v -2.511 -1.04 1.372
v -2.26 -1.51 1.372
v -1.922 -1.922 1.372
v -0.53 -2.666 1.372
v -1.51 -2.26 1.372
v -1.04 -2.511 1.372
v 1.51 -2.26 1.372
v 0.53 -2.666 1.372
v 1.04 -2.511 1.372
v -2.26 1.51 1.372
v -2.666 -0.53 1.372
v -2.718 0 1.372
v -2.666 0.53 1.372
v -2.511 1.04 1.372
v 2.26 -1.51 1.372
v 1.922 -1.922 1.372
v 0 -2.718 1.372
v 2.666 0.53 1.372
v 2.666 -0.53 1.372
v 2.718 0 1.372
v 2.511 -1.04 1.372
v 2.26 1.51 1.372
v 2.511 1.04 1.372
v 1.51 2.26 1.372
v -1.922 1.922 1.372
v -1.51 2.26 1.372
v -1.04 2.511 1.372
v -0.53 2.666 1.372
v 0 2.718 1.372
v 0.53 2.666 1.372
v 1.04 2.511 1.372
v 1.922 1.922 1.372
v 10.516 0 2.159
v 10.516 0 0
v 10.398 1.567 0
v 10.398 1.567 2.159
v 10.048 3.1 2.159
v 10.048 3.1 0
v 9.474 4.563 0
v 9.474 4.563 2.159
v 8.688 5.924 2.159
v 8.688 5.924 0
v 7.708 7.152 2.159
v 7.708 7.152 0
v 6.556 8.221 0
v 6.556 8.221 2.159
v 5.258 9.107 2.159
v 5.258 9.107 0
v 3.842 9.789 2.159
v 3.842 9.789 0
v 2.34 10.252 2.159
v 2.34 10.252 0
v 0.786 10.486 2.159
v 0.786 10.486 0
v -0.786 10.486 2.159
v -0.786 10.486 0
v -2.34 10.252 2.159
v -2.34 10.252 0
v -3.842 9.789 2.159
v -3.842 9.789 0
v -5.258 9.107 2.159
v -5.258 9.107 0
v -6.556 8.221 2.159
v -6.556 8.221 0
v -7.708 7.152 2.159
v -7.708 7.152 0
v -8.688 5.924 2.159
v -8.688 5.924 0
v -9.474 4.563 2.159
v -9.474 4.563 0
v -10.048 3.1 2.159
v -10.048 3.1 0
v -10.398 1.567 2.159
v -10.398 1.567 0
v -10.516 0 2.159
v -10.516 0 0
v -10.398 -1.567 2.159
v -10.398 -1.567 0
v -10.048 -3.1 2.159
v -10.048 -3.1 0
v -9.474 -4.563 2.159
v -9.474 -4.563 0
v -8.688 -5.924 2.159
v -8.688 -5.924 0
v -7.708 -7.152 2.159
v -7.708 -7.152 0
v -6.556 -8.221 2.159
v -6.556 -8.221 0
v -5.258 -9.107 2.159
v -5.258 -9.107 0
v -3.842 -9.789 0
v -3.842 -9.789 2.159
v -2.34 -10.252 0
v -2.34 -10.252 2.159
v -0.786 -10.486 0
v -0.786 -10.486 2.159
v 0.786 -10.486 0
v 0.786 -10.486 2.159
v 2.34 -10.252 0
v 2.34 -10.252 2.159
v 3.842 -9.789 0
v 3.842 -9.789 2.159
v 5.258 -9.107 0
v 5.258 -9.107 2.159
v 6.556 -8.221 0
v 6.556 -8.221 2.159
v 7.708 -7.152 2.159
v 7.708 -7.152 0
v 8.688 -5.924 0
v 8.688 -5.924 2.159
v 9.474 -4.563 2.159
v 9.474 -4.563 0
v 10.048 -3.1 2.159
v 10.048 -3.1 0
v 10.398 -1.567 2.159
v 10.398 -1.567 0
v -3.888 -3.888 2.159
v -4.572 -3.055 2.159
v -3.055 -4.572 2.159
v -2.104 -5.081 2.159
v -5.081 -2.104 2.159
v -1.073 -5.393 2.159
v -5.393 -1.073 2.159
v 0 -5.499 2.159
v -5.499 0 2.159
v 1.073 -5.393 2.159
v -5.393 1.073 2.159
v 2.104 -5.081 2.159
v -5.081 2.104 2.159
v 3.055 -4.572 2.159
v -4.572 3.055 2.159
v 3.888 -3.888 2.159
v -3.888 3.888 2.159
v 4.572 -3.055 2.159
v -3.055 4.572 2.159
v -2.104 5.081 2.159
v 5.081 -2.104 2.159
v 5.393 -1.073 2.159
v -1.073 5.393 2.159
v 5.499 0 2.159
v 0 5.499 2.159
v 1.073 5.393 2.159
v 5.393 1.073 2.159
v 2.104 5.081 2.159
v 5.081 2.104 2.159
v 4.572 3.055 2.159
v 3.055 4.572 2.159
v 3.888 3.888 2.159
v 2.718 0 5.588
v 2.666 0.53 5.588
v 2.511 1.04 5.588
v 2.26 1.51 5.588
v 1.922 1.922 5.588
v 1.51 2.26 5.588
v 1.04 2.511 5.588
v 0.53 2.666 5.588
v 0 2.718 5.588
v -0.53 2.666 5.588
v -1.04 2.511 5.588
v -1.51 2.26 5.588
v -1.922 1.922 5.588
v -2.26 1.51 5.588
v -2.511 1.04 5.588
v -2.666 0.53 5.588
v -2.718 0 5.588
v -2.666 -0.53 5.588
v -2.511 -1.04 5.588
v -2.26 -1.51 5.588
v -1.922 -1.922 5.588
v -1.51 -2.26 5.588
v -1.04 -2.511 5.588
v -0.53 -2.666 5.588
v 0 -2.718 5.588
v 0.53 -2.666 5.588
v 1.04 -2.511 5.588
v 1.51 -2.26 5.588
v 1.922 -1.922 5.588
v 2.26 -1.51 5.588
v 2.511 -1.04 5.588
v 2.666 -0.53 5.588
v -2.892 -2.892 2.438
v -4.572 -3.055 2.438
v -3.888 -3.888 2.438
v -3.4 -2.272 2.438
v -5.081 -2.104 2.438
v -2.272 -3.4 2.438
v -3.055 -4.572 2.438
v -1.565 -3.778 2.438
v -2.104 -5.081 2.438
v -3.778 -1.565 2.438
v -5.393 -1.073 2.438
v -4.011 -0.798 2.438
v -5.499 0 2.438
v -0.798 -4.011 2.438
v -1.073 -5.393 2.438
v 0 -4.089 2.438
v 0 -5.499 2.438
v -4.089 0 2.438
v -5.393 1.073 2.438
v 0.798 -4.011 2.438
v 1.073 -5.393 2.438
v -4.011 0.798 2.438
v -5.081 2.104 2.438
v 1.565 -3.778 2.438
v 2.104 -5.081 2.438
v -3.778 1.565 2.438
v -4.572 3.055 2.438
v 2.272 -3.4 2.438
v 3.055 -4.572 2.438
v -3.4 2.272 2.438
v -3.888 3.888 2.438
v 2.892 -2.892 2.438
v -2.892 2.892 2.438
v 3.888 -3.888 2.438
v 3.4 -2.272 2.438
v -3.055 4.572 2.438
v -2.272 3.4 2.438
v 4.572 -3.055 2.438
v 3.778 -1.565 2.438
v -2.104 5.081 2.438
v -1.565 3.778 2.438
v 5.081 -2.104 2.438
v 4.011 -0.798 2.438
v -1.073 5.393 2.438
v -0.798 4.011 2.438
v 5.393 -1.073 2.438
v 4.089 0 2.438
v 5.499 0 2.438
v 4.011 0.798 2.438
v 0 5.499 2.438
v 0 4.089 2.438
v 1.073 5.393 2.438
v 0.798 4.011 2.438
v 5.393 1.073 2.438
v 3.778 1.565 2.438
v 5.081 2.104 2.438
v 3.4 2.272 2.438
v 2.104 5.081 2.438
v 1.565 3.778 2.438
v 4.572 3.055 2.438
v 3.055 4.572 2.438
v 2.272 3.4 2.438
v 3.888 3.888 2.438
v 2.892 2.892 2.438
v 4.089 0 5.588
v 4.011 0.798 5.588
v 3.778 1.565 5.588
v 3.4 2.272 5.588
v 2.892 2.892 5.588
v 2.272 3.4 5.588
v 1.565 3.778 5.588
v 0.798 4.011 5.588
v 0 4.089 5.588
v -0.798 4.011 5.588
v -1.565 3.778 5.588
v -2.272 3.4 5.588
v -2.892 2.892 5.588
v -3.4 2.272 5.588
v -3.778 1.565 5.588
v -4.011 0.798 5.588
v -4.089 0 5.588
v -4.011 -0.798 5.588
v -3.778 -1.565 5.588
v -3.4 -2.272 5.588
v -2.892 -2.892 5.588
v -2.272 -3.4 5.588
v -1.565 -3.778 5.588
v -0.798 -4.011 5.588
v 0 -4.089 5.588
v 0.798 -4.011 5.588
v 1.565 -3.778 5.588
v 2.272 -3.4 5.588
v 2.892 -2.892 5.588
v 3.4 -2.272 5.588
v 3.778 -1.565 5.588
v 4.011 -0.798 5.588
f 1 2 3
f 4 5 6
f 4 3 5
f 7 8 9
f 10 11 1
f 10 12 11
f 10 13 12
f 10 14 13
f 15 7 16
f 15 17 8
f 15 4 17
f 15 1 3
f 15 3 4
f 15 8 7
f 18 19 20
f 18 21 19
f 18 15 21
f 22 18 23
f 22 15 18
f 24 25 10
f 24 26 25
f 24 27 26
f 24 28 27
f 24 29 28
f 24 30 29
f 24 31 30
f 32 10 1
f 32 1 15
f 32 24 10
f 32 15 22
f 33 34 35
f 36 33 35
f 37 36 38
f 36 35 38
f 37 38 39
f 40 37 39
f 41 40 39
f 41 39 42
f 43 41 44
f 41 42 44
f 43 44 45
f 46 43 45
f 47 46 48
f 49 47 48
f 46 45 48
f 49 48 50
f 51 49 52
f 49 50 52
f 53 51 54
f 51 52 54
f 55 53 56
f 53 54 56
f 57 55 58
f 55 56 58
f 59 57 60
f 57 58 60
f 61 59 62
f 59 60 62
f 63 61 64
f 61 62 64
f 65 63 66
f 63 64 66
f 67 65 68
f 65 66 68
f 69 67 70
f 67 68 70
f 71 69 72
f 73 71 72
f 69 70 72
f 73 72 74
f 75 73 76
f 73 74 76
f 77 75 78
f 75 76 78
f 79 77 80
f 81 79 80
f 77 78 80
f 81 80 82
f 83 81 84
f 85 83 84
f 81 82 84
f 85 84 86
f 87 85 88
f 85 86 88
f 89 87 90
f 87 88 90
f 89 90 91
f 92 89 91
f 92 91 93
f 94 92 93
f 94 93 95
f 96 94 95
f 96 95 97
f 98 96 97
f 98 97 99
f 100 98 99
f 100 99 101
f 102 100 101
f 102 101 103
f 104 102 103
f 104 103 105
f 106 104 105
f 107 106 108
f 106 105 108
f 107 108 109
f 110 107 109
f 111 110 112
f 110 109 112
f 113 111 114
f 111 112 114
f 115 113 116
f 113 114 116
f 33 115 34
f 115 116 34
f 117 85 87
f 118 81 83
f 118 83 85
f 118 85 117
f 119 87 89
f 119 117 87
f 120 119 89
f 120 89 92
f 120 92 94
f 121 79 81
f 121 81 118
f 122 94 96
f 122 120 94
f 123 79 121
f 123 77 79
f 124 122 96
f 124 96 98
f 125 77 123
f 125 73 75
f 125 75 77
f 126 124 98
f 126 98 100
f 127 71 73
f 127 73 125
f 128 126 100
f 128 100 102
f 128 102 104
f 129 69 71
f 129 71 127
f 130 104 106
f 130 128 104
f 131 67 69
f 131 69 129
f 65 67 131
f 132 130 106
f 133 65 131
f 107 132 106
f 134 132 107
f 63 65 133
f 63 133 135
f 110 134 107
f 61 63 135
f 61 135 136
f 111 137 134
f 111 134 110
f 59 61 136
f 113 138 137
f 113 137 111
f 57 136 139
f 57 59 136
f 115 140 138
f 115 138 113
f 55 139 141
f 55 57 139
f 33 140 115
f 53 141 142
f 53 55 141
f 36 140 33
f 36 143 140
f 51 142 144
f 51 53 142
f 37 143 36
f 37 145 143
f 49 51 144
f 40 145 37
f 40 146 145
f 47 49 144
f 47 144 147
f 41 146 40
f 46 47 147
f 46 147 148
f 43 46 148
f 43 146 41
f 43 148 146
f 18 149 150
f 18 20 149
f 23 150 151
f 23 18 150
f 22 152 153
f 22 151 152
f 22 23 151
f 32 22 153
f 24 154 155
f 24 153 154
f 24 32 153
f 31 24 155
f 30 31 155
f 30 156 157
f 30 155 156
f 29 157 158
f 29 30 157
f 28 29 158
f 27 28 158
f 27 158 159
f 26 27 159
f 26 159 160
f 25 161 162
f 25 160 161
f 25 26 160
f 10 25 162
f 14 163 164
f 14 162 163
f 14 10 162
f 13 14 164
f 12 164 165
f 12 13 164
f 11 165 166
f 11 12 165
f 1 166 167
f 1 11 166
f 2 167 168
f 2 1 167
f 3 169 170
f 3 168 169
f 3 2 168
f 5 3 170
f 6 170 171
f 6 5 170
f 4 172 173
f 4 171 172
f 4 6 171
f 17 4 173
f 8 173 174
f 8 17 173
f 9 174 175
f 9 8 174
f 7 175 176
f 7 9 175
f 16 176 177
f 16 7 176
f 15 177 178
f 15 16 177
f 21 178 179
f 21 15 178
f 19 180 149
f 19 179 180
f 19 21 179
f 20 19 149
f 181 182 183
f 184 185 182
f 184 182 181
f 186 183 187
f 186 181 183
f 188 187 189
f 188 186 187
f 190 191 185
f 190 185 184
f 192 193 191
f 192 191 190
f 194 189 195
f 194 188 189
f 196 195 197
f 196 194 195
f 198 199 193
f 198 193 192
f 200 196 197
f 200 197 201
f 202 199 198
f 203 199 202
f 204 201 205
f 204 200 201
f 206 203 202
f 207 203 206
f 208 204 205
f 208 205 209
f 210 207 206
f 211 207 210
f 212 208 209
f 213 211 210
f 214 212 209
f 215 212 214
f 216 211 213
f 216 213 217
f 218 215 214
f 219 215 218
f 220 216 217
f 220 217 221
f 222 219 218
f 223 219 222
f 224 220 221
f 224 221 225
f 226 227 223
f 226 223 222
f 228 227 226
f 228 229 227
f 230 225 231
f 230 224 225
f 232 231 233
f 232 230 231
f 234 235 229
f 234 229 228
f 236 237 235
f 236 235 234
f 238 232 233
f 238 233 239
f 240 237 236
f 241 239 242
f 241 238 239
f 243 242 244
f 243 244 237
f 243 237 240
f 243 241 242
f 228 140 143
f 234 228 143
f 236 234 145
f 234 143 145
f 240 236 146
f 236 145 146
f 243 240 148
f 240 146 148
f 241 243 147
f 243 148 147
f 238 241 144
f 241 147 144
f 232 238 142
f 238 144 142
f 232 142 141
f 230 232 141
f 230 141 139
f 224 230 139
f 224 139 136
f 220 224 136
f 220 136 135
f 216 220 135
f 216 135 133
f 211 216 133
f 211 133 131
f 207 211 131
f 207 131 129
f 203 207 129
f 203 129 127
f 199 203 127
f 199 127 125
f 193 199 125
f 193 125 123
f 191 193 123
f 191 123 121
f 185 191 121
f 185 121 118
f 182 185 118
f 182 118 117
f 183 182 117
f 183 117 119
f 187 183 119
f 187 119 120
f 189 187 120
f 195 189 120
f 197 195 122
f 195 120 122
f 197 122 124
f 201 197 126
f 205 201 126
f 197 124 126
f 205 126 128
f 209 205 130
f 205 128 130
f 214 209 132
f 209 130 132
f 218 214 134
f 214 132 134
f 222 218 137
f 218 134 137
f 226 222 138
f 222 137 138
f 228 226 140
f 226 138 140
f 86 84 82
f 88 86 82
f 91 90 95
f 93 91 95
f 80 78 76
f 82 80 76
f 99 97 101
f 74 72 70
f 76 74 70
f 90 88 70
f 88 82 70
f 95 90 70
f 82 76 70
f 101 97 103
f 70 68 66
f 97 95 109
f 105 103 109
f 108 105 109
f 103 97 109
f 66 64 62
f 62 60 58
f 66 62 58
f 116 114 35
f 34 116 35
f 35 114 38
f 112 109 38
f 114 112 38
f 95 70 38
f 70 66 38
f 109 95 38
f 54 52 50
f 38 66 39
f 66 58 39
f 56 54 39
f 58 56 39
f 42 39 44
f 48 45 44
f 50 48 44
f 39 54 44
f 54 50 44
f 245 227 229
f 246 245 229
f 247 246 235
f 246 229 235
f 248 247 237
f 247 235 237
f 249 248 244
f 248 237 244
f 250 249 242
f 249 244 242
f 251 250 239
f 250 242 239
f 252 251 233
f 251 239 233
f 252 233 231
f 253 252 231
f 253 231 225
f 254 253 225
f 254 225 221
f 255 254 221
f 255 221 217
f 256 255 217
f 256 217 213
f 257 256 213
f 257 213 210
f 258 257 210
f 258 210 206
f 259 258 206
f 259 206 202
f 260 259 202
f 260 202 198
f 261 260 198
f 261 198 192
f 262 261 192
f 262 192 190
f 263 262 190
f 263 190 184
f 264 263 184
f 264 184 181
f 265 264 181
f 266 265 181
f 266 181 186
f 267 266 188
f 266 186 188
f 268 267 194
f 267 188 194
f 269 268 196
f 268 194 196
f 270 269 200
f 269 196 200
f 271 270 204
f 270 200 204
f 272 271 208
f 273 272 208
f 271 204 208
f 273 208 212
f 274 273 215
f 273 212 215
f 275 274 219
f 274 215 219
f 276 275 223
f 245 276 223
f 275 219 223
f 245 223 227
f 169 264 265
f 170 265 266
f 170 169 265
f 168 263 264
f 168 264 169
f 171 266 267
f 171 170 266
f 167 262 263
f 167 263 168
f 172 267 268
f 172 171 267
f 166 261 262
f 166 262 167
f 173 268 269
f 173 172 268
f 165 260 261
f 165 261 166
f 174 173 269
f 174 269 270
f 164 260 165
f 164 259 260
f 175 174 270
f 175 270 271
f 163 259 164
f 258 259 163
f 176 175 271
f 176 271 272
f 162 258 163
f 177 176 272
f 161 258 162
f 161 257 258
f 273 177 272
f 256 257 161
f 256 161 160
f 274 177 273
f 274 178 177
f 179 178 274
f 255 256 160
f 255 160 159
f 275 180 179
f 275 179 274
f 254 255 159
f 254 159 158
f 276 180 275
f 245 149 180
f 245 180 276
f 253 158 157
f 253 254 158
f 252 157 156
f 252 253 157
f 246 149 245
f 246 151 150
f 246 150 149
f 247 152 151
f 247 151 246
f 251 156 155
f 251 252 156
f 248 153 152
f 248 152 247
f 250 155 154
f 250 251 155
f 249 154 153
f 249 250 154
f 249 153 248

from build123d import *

# Parameters (mm, degrees)
F0_R     = 10.5156
F1_DEPTH = 2.159
F2_R     = 5.4991
F3_DEPTH = 2.4384
F4_R     = 4.0894
F5_DEPTH = 5.588
F6_T     = -1.3716


with BuildPart() as f1:
    # F0 (on Top) → F1 (new body)
    with BuildSketch(Plane.XY):
        Circle(F0_R)
    extrude(amount=F1_DEPTH)

    # F2 (on Top) → F3 (join)
    with BuildSketch(Plane.XY):
        Circle(F2_R)
    extrude(amount=F3_DEPTH)

    # F4 (on Top) → F5 (join)
    with BuildSketch(Plane.XY):
        Circle(F4_R)
    extrude(amount=F5_DEPTH)

    # F6
    f6_openings = [f1.faces().sort_by_distance(p)[0] for p in [
        (0, 0, 5.588),
    ]]
    offset(amount=F6_T, openings=f6_openings, kind=Kind.INTERSECTION)


solid = f1.part
